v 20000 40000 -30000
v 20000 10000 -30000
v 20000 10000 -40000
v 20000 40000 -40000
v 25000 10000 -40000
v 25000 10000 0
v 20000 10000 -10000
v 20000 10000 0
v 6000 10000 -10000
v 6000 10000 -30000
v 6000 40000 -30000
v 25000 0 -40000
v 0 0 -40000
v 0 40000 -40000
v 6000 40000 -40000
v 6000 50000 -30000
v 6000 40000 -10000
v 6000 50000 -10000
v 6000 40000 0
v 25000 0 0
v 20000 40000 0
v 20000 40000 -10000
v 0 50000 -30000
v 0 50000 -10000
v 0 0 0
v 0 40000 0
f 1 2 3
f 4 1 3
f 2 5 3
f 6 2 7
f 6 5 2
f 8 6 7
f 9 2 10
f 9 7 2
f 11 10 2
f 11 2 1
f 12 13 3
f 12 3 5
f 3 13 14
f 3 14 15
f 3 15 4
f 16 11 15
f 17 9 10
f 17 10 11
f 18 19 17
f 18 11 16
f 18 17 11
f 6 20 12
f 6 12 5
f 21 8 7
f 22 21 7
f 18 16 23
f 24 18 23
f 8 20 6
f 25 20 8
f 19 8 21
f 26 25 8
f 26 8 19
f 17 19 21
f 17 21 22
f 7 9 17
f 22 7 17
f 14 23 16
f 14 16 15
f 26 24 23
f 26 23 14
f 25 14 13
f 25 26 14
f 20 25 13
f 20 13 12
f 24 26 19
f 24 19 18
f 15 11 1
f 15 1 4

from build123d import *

# Parameters (mm, degrees)
BOSS_EXTRUDE1_DEPTH = 40000
CUT_EXTRUDE1_DEPTH  = 6000
SKETCH3_W           = 10000
SKETCH3_H           = 30000
BOSS_EXTRUDE2_DEPTH = 14000


with BuildPart() as part:
    # Sketch1 → Boss-Extrude1 (new body)
    with BuildSketch(Plane.XY):
        Polygon((6000, 50000), (0, 50000), (0, 0), (25000, 0), (25000, 10000), (6000, 10000), align=None)
    extrude(amount=-BOSS_EXTRUDE1_DEPTH)

    # Sketch2 → Cut-Extrude1 (cut)
    with BuildSketch(Plane.ZY):
        Polygon((-40000, 50000), (-30000, 50000), (-40000, 40000), align=None)
        Polygon((-10000, 50000), (0, 50000), (0, 40000), align=None)
    extrude(amount=-CUT_EXTRUDE1_DEPTH, mode=Mode.SUBTRACT)

    # Sketch3 → Boss-Extrude2 (add)
    with BuildSketch(Plane(origin=(6000, 0, 0), x_dir=(0, 0, -1), z_dir=(1, 0, 0))):
        with Locations((5000, 25000)):
            Rectangle(SKETCH3_W, SKETCH3_H)
        with Locations((35000, 25000)):
            Rectangle(SKETCH3_W, SKETCH3_H)
    extrude(amount=BOSS_EXTRUDE2_DEPTH)


solid = part.part
